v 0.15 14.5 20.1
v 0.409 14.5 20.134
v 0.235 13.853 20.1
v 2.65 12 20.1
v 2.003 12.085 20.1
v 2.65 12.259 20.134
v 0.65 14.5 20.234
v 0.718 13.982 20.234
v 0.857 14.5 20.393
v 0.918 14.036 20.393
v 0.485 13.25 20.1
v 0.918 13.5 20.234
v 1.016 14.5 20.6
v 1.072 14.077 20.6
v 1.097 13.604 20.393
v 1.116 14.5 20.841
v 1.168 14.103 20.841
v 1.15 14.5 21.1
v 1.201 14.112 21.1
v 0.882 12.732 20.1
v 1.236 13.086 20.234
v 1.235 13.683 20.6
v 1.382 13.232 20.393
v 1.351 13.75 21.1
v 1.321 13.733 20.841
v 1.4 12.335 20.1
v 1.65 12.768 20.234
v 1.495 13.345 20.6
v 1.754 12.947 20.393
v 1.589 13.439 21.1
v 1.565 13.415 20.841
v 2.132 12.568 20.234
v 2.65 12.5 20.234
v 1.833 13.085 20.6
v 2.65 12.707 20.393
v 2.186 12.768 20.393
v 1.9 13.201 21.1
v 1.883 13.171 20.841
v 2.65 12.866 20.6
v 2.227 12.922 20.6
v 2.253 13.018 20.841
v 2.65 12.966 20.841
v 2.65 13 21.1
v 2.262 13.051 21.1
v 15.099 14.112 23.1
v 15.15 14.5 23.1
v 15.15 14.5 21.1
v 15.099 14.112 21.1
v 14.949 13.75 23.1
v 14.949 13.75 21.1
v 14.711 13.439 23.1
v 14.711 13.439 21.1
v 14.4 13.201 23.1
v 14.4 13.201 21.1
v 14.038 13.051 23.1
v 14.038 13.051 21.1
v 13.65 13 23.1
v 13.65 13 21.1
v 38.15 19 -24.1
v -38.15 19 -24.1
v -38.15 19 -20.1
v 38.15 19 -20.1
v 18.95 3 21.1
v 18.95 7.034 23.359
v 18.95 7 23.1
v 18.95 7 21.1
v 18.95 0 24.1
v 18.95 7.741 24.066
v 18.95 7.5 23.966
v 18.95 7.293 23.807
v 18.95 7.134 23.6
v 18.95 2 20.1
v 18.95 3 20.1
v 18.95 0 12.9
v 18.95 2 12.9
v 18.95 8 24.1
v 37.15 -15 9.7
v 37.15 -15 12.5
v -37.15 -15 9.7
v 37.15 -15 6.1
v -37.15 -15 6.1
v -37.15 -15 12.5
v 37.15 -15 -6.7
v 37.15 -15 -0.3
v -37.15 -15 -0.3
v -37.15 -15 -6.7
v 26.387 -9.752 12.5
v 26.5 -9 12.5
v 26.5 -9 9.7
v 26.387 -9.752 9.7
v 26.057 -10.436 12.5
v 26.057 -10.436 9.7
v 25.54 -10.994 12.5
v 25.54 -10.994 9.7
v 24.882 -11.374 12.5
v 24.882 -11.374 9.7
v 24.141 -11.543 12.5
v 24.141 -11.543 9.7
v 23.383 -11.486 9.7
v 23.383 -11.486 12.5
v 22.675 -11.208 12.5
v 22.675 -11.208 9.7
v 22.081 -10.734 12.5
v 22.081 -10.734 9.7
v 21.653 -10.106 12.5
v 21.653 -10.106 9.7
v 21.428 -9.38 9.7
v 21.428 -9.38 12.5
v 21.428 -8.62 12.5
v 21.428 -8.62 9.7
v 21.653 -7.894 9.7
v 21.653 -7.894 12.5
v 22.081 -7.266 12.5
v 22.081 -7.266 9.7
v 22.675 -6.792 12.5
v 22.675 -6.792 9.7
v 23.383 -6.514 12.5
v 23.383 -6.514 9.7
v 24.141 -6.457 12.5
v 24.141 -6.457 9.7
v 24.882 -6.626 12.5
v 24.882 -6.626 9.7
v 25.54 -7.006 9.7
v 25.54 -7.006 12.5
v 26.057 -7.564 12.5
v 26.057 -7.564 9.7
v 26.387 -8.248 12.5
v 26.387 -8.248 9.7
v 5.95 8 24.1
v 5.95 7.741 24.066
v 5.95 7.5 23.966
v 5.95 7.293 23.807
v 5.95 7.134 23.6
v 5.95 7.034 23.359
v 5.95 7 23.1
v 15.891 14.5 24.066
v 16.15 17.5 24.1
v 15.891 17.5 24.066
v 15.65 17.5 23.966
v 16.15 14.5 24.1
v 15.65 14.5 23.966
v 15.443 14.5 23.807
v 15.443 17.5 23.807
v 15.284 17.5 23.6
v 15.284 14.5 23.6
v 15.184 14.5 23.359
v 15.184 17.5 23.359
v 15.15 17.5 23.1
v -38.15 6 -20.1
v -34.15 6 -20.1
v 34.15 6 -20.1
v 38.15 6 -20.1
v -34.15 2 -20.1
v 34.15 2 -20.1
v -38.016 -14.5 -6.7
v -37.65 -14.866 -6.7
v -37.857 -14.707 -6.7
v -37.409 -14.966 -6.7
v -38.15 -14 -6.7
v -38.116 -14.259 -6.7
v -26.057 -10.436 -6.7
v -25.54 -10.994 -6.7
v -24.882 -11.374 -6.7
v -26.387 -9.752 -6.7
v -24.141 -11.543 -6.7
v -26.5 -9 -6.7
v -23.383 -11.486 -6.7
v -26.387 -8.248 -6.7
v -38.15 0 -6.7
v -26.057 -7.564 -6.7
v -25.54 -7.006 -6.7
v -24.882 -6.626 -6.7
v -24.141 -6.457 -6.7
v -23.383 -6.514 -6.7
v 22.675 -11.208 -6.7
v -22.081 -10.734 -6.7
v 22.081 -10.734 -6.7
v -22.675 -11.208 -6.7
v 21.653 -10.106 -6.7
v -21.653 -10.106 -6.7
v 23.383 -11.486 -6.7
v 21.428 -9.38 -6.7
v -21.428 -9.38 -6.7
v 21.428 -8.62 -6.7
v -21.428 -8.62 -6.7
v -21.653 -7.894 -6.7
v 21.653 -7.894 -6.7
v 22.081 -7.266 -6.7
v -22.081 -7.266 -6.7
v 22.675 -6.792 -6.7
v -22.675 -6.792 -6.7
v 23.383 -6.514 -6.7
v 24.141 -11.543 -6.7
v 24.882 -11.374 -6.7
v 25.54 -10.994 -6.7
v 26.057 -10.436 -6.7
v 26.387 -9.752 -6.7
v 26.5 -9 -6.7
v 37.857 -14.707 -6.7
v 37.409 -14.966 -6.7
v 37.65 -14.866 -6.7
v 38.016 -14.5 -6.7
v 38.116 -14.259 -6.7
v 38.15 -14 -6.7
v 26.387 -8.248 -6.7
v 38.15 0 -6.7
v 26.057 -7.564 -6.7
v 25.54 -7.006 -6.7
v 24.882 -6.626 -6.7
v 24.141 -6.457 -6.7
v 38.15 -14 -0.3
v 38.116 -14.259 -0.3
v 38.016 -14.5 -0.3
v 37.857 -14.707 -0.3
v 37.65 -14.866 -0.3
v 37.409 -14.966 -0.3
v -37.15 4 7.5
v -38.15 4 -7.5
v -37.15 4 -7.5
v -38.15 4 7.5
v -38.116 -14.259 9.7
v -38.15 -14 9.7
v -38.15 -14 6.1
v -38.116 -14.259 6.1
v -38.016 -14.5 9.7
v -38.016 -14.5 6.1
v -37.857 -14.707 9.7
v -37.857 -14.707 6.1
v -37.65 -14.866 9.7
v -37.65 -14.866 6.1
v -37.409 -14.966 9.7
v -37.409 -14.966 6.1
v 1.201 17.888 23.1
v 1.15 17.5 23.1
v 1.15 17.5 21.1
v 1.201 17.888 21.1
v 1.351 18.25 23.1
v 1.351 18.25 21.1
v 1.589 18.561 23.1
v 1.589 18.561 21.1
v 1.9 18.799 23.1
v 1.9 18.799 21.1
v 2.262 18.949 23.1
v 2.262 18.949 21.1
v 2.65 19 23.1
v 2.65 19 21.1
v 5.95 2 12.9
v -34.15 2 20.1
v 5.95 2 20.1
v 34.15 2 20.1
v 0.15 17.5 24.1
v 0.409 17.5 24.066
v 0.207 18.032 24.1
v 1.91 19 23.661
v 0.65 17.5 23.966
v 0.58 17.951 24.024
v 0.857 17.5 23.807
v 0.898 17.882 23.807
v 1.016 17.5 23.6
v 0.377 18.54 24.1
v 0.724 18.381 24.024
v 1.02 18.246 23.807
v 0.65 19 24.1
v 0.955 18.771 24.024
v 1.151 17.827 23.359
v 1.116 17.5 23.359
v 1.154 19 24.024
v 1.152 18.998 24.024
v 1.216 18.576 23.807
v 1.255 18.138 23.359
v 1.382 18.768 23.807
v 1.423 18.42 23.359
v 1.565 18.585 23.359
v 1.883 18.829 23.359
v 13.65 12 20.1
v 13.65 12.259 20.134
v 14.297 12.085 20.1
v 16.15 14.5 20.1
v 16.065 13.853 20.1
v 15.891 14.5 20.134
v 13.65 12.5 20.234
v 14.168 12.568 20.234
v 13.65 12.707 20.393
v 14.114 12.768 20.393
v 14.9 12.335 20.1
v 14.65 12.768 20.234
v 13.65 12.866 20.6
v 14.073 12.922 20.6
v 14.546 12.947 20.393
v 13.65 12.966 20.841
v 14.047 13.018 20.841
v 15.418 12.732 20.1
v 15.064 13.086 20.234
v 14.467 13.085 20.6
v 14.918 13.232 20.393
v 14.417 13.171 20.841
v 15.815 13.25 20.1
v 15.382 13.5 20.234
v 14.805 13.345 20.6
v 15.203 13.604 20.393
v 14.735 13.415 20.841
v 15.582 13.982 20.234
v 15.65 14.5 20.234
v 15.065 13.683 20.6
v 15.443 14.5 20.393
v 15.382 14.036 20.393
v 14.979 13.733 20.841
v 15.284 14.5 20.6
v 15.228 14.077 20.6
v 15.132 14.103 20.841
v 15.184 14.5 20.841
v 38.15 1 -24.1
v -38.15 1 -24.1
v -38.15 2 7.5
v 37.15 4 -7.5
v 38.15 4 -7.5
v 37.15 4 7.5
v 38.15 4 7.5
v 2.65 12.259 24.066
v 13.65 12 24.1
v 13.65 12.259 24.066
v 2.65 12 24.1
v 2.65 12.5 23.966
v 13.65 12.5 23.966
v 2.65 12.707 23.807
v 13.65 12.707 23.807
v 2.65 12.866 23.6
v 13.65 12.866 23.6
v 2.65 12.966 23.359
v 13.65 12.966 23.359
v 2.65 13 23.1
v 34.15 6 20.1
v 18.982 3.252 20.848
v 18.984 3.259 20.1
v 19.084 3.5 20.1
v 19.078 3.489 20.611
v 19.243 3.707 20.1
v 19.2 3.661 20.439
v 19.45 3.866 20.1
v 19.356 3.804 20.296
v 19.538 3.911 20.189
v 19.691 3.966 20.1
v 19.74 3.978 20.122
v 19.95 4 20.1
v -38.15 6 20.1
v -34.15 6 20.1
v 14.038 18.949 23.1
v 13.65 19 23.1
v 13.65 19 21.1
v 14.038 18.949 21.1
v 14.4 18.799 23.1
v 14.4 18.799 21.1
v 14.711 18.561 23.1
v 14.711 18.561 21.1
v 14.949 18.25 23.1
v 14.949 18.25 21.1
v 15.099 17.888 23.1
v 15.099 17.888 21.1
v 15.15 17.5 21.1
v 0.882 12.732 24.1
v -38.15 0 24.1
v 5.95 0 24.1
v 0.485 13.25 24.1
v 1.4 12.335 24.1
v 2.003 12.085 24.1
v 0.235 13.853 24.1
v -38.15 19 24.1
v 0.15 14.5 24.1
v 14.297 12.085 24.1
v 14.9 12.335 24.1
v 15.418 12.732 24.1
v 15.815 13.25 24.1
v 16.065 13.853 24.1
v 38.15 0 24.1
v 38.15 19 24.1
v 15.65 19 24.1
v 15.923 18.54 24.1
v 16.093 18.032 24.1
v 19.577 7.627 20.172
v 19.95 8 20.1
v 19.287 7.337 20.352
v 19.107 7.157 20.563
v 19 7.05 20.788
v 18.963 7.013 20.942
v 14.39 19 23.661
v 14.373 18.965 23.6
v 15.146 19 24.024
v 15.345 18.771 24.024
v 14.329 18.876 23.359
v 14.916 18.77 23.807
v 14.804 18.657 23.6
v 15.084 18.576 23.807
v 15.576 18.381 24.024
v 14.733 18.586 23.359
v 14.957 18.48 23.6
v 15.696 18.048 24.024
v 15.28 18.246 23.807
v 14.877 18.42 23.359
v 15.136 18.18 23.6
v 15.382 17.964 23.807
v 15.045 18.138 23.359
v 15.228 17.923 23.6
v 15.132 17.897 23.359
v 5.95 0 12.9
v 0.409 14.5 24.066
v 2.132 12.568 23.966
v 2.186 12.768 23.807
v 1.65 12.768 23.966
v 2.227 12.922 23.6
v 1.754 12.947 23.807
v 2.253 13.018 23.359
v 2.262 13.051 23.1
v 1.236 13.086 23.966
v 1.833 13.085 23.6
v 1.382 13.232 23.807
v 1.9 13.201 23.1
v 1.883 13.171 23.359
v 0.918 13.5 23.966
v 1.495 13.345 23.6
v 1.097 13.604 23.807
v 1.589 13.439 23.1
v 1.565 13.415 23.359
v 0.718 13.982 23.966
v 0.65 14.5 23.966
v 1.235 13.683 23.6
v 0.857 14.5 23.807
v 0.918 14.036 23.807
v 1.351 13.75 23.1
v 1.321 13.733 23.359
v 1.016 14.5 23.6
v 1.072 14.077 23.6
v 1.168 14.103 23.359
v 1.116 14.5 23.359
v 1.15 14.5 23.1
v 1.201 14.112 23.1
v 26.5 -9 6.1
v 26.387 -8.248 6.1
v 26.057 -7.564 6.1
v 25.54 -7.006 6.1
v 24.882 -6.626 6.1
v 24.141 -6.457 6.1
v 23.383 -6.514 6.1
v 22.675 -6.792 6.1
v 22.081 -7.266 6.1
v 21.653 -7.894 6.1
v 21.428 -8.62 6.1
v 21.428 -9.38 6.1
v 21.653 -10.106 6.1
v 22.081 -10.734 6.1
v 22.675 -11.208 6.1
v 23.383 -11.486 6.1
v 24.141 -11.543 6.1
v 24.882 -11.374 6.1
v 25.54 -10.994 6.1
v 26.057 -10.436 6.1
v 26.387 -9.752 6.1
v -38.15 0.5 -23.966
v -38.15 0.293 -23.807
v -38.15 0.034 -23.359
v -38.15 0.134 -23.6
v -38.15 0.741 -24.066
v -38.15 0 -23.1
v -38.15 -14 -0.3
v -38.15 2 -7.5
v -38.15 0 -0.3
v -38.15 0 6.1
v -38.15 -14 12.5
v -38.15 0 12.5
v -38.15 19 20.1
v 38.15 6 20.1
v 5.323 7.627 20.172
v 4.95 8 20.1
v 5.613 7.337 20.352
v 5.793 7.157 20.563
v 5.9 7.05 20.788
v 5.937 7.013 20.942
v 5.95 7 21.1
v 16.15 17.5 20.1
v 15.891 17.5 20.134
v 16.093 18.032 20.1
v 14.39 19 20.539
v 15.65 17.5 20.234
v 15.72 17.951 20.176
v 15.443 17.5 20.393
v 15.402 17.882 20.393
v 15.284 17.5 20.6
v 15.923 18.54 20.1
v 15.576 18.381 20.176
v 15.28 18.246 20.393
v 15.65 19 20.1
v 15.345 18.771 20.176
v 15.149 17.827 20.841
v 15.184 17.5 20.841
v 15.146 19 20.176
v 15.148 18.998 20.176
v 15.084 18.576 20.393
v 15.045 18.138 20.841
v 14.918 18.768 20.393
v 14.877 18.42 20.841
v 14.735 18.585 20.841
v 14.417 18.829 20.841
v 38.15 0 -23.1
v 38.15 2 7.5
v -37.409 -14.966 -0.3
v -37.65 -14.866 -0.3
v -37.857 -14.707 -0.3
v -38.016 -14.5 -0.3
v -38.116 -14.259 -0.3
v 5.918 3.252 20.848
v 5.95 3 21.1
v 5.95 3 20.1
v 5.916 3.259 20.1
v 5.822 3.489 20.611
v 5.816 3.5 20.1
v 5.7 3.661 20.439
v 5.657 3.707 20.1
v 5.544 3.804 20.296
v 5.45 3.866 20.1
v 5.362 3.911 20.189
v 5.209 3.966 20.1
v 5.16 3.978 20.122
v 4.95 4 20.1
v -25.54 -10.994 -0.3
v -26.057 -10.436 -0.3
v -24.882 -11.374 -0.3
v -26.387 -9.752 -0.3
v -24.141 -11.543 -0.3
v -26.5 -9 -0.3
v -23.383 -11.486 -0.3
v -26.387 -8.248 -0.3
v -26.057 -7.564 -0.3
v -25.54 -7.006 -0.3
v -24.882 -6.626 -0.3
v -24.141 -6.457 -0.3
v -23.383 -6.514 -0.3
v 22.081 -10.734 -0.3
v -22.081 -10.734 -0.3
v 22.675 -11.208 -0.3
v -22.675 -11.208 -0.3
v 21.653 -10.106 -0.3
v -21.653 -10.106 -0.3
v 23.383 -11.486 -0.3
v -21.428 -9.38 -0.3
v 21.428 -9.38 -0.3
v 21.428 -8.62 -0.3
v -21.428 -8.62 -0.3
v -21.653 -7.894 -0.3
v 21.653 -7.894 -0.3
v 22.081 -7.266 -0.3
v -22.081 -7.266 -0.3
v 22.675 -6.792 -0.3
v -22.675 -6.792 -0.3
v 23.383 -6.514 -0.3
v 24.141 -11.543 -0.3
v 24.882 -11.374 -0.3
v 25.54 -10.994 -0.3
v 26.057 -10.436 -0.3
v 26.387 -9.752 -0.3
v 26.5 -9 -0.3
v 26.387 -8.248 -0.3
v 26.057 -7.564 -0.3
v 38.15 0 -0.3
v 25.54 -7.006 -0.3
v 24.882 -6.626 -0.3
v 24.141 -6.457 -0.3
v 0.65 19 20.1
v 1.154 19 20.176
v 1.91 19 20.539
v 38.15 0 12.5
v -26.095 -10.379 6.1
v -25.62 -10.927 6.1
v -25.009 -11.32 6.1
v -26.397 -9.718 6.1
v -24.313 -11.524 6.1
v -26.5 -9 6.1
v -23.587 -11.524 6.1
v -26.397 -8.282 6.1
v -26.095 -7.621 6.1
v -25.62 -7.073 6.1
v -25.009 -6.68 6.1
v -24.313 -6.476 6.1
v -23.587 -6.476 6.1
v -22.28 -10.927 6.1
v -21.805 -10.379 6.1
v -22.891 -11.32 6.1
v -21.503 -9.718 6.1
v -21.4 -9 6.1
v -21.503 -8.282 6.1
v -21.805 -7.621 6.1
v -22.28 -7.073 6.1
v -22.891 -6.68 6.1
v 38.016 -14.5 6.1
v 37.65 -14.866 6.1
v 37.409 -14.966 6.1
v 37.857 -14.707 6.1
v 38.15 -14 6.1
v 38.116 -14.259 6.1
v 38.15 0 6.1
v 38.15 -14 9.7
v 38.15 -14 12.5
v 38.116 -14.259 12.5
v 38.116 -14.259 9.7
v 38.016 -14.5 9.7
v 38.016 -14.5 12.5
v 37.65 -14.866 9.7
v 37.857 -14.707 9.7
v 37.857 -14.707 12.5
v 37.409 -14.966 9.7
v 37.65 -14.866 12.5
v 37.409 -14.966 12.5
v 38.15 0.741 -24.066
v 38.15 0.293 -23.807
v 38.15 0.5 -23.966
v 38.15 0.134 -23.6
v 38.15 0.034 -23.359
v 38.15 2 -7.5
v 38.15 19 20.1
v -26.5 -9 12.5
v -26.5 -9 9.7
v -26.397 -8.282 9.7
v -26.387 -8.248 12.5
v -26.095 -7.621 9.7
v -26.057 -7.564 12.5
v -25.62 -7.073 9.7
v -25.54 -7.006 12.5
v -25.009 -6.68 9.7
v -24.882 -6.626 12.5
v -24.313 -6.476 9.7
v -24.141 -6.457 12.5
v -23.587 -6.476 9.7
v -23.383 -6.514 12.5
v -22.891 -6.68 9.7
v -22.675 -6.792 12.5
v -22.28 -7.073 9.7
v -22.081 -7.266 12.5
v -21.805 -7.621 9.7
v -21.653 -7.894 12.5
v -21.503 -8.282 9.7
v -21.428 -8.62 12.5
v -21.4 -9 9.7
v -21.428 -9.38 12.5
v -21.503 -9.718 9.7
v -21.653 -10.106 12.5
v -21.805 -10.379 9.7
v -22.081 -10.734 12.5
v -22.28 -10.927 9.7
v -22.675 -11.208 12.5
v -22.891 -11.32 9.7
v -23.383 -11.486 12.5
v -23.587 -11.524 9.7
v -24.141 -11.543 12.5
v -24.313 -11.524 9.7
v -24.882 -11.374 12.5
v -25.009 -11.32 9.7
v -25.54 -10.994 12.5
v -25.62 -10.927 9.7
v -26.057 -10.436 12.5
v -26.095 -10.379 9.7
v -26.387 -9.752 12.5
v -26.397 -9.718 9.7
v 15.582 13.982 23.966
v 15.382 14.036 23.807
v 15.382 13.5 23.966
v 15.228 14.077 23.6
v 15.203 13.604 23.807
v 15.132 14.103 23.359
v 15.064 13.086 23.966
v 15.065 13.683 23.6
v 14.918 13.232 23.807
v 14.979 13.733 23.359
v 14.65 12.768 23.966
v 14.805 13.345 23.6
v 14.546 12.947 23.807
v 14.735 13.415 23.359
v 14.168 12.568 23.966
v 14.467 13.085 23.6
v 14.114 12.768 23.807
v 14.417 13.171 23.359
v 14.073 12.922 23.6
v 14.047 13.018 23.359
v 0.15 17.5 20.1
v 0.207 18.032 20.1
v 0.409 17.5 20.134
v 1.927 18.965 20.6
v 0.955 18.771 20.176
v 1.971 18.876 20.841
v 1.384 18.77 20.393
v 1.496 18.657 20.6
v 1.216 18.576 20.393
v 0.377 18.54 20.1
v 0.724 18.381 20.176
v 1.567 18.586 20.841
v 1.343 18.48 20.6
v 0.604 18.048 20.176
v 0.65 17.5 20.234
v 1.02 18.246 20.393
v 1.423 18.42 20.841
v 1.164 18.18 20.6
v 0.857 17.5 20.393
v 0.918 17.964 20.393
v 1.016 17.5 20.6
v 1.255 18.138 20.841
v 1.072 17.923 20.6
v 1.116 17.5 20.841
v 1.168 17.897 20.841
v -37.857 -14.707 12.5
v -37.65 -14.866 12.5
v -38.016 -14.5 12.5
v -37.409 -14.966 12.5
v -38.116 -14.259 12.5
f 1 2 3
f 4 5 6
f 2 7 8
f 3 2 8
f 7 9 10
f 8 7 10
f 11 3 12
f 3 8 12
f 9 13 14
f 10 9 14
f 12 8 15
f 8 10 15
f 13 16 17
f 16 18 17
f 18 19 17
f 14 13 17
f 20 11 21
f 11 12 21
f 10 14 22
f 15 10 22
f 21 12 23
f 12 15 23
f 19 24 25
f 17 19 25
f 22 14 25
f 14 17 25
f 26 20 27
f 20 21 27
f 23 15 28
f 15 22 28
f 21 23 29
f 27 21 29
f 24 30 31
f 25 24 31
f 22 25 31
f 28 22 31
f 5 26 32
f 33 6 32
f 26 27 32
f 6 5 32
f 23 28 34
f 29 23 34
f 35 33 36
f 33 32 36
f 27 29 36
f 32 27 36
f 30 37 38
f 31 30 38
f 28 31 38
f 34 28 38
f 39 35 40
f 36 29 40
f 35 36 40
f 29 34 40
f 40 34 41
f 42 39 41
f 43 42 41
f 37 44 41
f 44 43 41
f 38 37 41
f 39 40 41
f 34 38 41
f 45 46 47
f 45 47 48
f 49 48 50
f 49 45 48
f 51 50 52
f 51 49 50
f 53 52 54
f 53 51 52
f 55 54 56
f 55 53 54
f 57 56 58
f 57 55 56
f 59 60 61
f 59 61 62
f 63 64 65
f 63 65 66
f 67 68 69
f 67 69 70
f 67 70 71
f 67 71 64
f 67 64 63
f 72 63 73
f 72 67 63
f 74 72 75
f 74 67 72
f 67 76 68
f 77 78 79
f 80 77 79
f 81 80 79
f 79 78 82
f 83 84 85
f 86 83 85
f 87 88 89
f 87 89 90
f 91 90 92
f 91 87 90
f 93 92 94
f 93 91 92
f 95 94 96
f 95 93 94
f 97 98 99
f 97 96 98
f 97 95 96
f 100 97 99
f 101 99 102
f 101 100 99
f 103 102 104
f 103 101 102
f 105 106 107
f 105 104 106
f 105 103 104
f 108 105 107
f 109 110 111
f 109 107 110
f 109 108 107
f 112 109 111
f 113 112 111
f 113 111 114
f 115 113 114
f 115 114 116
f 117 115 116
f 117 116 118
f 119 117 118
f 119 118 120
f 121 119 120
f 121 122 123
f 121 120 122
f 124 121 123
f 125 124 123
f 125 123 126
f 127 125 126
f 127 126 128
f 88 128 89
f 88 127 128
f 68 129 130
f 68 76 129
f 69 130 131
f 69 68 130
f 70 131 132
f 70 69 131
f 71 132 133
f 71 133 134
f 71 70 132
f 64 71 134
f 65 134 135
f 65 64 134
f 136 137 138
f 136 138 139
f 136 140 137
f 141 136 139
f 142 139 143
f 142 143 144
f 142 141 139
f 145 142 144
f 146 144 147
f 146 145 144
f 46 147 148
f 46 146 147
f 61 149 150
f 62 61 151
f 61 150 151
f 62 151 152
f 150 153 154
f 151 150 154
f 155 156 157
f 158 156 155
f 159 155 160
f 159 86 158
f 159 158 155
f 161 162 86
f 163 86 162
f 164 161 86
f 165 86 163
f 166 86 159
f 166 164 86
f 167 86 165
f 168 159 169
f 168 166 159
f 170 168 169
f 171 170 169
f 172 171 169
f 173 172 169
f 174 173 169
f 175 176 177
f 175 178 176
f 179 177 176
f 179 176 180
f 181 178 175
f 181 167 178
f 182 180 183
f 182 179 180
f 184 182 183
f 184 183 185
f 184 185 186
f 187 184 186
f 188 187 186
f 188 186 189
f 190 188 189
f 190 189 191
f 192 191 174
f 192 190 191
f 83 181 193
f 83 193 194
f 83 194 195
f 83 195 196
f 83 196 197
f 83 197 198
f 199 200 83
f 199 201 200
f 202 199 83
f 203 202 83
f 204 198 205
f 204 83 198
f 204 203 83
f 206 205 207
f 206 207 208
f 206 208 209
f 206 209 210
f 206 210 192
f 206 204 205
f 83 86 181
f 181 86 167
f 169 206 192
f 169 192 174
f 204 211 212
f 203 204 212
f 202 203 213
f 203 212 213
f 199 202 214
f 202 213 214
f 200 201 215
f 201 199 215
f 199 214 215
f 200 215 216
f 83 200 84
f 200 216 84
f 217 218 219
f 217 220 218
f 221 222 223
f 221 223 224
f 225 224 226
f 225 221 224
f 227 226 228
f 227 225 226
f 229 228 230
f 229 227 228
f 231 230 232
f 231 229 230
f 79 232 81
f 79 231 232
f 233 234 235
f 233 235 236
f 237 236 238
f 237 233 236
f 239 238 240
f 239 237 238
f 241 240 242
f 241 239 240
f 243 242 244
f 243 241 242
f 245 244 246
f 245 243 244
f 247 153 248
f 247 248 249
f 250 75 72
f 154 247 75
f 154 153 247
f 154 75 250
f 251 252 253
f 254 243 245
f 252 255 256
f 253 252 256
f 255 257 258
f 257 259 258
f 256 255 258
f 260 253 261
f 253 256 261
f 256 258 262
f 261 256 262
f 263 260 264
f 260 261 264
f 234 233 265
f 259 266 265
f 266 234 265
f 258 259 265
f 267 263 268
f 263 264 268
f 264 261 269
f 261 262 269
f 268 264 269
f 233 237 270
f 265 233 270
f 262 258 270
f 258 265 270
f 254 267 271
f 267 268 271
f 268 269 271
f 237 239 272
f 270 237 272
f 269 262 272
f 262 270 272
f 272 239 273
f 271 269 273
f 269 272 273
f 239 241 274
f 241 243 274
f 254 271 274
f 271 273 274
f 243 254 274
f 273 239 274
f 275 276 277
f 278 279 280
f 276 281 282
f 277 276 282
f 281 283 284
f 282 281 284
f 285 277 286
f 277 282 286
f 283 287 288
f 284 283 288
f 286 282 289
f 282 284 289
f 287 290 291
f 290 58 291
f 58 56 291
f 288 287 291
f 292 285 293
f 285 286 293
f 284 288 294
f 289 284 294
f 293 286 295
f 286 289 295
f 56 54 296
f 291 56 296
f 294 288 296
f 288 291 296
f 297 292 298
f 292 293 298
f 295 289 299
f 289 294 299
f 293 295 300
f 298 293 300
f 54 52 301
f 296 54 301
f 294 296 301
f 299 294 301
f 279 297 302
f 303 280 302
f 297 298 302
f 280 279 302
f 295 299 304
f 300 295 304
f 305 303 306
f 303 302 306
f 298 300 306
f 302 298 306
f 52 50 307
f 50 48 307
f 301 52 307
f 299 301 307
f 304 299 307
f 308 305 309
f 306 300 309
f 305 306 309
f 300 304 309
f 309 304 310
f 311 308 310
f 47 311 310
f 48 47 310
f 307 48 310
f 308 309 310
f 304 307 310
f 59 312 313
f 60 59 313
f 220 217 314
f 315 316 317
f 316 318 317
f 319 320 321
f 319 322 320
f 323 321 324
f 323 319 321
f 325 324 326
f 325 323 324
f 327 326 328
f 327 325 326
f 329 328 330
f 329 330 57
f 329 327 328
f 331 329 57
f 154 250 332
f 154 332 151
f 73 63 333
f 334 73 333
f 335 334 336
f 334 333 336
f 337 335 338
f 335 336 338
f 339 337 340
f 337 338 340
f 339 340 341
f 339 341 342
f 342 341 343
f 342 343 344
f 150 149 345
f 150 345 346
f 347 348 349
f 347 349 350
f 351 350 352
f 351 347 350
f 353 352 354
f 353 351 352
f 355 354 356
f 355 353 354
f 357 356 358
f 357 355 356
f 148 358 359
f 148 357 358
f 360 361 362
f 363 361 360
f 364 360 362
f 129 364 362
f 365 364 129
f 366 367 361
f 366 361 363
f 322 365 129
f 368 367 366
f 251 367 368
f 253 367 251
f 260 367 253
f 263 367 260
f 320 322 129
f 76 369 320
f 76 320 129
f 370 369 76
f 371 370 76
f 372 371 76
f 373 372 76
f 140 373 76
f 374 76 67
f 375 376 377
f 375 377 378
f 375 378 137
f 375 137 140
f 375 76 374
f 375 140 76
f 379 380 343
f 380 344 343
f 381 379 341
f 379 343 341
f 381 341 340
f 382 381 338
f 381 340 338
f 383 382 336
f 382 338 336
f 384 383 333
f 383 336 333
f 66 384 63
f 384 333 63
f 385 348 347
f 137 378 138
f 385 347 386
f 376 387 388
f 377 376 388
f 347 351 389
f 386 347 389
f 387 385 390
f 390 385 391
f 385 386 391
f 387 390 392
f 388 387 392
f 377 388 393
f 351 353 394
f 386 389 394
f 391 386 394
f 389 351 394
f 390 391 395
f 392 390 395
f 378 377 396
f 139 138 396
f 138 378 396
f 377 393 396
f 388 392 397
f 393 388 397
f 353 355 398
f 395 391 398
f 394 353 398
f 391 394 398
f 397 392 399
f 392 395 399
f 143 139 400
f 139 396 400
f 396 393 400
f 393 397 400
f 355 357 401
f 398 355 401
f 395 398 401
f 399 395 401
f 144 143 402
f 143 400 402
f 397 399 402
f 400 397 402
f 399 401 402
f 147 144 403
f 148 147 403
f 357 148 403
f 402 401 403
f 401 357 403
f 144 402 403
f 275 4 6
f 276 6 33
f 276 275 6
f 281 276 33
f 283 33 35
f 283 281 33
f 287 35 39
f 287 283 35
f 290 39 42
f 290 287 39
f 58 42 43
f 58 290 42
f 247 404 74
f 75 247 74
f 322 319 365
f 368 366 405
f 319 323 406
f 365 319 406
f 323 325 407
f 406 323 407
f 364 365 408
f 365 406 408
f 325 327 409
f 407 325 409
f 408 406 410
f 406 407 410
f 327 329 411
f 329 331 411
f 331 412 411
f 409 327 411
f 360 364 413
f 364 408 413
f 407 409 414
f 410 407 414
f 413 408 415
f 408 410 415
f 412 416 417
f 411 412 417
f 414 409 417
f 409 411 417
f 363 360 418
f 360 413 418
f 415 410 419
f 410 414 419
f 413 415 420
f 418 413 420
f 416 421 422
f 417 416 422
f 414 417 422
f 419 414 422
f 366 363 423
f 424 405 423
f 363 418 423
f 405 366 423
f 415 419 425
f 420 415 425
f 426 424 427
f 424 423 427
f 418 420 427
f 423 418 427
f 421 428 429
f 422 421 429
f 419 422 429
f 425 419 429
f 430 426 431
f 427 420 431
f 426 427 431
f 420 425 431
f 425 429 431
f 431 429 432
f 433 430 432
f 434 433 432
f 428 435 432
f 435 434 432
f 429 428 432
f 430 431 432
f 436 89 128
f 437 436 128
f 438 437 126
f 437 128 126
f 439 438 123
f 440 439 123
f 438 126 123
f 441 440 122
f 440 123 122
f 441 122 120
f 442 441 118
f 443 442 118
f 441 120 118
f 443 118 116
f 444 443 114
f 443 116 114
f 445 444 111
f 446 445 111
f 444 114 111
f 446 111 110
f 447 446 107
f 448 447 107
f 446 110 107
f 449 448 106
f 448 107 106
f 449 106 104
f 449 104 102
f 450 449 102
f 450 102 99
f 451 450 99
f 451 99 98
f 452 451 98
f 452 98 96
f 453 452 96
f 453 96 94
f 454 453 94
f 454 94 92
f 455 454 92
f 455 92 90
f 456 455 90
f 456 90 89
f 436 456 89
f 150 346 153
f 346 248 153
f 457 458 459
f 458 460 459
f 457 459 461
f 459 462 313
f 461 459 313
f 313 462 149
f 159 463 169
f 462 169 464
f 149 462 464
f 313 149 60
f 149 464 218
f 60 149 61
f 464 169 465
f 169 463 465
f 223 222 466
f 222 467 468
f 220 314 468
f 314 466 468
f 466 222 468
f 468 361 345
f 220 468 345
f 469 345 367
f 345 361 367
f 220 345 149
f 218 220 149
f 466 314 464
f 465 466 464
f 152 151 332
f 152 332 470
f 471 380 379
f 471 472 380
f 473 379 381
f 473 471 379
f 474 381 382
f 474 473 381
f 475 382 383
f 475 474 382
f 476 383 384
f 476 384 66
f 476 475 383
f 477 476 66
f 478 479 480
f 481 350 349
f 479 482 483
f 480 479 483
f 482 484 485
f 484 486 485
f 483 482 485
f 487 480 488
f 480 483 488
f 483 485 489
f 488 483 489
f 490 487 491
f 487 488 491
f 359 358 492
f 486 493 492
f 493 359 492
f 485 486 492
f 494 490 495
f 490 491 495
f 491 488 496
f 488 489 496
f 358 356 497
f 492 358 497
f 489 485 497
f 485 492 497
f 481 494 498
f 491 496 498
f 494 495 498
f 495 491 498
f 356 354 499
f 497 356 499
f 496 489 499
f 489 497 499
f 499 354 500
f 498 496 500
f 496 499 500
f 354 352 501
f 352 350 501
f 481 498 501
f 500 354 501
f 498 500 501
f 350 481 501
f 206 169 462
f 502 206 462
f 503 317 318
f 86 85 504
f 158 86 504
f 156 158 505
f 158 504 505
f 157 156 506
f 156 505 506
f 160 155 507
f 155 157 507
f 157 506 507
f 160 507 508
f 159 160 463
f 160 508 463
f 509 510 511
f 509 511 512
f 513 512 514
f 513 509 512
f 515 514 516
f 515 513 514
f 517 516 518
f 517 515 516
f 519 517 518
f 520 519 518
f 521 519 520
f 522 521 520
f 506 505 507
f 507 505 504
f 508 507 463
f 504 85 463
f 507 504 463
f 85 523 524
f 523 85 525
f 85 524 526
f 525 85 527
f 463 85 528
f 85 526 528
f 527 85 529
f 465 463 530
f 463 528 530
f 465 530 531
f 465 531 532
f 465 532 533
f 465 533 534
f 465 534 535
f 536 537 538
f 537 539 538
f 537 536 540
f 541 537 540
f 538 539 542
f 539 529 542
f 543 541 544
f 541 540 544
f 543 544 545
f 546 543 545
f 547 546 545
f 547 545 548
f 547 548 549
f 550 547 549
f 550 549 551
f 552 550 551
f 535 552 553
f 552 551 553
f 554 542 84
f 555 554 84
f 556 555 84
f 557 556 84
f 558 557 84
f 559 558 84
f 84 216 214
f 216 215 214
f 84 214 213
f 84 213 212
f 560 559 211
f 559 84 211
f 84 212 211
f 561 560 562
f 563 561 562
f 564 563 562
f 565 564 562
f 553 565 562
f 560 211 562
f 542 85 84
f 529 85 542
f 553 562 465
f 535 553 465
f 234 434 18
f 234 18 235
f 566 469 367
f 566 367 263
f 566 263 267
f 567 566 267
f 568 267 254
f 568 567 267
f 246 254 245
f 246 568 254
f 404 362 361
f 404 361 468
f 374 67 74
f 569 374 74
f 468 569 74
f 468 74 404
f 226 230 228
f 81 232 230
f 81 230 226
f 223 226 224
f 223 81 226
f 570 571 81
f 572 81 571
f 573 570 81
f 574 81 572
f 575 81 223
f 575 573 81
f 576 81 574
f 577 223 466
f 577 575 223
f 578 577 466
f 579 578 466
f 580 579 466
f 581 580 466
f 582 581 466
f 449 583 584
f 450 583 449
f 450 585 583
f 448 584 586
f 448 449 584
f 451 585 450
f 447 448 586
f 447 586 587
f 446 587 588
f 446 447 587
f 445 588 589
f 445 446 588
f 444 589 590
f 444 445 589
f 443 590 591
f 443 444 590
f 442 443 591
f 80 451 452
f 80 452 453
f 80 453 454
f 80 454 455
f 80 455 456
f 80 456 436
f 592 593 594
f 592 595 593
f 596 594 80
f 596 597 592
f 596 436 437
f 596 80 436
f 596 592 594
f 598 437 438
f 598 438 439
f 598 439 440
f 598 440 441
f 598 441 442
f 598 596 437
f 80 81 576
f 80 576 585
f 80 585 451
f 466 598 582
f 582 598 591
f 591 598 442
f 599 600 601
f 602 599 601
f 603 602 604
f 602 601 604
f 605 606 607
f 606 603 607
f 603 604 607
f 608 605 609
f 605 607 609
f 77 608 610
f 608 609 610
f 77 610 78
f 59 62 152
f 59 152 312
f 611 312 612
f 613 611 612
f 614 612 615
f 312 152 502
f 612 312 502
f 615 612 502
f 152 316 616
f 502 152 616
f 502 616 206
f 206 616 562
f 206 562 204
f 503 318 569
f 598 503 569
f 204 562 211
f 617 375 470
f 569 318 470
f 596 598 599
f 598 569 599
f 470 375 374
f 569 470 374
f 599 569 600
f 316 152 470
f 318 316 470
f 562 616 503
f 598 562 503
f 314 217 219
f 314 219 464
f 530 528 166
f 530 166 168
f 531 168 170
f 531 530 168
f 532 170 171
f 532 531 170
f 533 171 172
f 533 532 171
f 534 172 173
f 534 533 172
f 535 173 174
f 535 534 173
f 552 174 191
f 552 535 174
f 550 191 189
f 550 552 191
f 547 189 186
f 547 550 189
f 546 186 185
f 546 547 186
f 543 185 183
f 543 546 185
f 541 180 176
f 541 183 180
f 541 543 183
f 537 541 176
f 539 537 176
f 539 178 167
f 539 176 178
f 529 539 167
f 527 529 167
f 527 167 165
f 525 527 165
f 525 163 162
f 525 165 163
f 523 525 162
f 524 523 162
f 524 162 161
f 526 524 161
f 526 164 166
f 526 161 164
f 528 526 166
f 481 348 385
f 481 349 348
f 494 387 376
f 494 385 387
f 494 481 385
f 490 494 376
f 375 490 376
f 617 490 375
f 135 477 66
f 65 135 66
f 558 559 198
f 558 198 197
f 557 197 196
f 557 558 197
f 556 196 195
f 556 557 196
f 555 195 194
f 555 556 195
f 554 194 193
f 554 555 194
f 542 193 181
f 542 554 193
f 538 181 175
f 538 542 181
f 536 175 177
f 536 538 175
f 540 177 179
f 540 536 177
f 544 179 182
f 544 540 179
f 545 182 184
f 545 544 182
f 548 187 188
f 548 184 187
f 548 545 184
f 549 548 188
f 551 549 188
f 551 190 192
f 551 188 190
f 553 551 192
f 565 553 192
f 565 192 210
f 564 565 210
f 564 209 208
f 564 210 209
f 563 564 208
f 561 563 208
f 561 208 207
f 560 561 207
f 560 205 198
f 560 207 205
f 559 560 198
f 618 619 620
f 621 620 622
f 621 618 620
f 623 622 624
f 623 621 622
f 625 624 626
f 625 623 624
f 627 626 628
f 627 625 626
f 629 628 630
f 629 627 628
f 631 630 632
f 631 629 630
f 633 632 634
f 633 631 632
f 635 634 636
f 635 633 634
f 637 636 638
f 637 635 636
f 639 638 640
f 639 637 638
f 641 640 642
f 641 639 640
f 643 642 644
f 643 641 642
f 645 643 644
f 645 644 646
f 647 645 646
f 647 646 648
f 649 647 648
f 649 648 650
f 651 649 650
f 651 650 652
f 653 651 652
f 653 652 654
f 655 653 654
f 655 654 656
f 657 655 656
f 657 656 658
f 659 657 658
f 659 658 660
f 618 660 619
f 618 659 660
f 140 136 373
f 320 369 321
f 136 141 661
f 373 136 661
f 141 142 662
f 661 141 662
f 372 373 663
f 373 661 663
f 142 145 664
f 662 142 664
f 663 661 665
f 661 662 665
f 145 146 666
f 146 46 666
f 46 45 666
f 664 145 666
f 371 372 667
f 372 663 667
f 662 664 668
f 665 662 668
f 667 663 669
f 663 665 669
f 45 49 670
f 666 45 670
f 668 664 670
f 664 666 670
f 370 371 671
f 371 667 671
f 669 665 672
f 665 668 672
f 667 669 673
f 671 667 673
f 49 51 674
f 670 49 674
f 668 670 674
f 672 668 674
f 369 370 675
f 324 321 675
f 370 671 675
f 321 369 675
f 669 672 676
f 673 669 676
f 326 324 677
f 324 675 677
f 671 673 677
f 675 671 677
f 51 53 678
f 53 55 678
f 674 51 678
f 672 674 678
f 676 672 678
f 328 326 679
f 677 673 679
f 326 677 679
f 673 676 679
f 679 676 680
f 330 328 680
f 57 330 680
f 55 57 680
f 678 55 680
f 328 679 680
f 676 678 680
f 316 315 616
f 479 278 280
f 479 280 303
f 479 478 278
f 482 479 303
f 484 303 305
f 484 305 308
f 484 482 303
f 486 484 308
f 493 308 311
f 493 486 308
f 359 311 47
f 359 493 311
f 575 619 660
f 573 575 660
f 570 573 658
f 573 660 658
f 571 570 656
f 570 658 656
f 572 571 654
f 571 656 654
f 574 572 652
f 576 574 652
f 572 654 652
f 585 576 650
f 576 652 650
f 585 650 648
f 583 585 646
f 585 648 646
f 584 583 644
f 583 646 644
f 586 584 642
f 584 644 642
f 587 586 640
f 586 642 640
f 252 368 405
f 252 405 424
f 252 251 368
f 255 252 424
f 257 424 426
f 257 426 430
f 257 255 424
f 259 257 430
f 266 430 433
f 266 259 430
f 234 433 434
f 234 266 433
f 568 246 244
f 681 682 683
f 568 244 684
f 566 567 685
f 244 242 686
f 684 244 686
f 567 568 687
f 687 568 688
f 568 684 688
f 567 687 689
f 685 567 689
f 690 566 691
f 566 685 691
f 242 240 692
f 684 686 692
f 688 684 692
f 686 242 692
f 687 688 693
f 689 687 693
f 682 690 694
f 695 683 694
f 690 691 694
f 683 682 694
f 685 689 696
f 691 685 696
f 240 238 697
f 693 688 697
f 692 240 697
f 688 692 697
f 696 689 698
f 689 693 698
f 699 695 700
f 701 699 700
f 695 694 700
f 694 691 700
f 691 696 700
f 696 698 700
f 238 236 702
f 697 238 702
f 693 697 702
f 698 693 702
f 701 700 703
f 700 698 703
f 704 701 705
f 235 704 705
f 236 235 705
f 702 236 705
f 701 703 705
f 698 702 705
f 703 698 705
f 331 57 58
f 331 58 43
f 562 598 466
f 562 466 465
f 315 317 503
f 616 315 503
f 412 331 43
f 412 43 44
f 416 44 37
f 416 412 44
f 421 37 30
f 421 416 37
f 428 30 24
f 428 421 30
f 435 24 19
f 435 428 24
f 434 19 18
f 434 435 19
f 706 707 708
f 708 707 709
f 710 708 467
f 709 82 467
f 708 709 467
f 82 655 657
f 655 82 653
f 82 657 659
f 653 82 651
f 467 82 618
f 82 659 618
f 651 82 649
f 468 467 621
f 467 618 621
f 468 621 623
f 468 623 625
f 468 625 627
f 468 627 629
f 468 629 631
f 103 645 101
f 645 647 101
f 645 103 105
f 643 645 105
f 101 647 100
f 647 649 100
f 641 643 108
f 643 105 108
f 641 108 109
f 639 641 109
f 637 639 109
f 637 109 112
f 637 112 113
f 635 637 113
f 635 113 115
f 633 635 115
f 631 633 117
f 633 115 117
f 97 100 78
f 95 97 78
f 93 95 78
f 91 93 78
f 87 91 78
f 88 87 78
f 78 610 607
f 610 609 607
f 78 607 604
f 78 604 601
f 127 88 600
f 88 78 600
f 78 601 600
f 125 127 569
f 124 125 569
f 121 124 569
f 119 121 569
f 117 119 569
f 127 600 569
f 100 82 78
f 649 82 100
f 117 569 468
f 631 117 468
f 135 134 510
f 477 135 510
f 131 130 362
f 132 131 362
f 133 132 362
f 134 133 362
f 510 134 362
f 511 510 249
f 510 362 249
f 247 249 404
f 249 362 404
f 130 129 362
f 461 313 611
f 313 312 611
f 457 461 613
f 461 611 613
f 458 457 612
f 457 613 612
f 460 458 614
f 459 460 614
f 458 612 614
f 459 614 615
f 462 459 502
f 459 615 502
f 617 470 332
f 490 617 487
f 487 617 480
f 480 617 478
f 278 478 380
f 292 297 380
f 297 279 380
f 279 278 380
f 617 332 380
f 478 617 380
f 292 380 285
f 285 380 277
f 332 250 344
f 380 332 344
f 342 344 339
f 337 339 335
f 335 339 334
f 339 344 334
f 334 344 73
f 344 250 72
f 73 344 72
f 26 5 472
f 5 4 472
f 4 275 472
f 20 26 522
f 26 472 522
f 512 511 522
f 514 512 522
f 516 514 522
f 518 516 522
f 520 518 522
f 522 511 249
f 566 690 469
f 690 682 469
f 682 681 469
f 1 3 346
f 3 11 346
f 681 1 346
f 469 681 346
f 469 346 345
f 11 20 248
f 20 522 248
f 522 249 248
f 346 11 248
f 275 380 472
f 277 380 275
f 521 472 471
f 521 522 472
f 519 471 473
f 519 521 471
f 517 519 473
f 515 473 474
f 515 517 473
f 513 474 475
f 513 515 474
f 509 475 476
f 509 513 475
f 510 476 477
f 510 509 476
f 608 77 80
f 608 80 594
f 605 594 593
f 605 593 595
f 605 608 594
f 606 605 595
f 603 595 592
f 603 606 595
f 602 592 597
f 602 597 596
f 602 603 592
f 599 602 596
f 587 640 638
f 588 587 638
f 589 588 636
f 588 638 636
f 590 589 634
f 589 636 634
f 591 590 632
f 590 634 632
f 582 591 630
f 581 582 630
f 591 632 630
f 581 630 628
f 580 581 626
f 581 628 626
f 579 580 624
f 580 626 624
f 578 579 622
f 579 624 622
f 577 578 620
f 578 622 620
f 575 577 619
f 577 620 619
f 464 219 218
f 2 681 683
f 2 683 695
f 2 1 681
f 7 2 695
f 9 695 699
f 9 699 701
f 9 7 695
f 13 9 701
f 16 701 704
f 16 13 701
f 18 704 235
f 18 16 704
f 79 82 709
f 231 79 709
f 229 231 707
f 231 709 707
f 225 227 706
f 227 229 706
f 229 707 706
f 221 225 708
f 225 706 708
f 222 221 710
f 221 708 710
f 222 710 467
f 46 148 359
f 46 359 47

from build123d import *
from build123d.topology import SkipClean

# Parameters (mm, degrees)
SKETCH2_W               = 76.3
SKETCH2_H               = 48.2
BOSS_EXTRUDE1_DEPTH     = 4
BOSS_EXTRUDE2_DEPTH     = 15
SKETCH10_W              = 4
SKETCH10_H              = 40.2
BOSS_EXTRUDE5_DEPTH     = 2
CUT_EXTRUDE1_DEPTH      = 3
CUT_EXTRUDE1_DEPTH_BACK = 4
SKETCH5_W               = 13
SKETCH5_H               = 11.2
CUT_EXTRUDE2_REACH      = 66.34
CUT_EXTRUDE3_DEPTH      = 7.5
FILLET3_R               = 1
SKETCH17_W              = 76.3
SKETCH17_H              = 8
SKETCH17_H_2            = 6
BOSS_EXTRUDE6_DEPTH     = 15
SKETCH20_R              = 2.55
CUT_EXTRUDE5_DEPTH      = 65.340209
FILLET4_R               = 1
FILLET5_R               = 1
SKETCH21_W              = 68.3
SKETCH21_H              = 40.2
CUT_EXTRUDE6_DEPTH      = 2
SKETCH29_R              = 2.55
BOSS_EXTRUDE9_DEPTH     = 40.2
SKETCH30_W              = 17.4
SKETCH30_H              = 15
SKETCH30_W_2            = 11.6
SKETCH30_W_3            = 6.4
CUT_EXTRUDE12_DEPTH     = 83.240501


with BuildPart() as part:
    # Sketch2 → Boss-Extrude1 (new body)
    with BuildSketch(Plane(origin=(0, 0, 0), x_dir=(1, 0, 0), z_dir=(0, 1, 0))):
        Rectangle(SKETCH2_W, SKETCH2_H)
    extrude(amount=BOSS_EXTRUDE1_DEPTH)

    # Sketch3 → Boss-Extrude2 (add)
    with BuildSketch(Plane(origin=(0, 4, 0), x_dir=(1, 0, 0), z_dir=(0, 1, 0))):
        Polygon((38.15, 24.1), (-38.15, 24.1), (-38.15, 20.1), (-34.15, 20.1), (34.15, 20.1), (38.15, 20.1), align=None)
        Polygon((-38.15, -24.1), (38.15, -24.1), (38.15, -20.1), (34.15, -20.1), (-34.15, -20.1), (-38.15, -20.1), align=None)
    extrude(amount=BOSS_EXTRUDE2_DEPTH)

    # Sketch10 → Boss-Extrude5 (add)
    with BuildSketch(Plane(origin=(0, 4, 0), x_dir=(1, 0, 0), z_dir=(0, 1, 0))):
        with Locations((-36.15, 0)):
            Rectangle(SKETCH10_W, SKETCH10_H)
        with Locations((36.15, 0)):
            Rectangle(SKETCH10_W, SKETCH10_H)
    extrude(amount=BOSS_EXTRUDE5_DEPTH)

    # Sketch5 → Cut-Extrude1 (cut, two sides: drawn at the far end of the back side and taken through both)
    with BuildSketch(Plane(origin=(0, 4, 0), x_dir=(1, 0, 0), z_dir=(0, 1, 0)).offset(-CUT_EXTRUDE1_DEPTH_BACK)):
        with Locations((12.45, -18.5)):
            Rectangle(SKETCH5_W, SKETCH5_H)
    extrude(amount=CUT_EXTRUDE1_DEPTH + CUT_EXTRUDE1_DEPTH_BACK, mode=Mode.SUBTRACT)

    # Sketch8 → Cut-Extrude2 (cut, up to next)
    with BuildSketch(Plane.XY.offset(24.1), mode=Mode.PRIVATE) as cut_extrude2_sk1:
        with BuildLine():
            Line((2.65, 19), (13.65, 19))
            ThreePointArc((13.65, 19), (14.71066, 18.56066), (15.15, 17.5))
            Line((15.15, 17.5), (15.15, 14.5))
            ThreePointArc((15.15, 14.5), (14.71066, 13.43934), (13.65, 13))
            Line((13.65, 13), (2.65, 13))
            ThreePointArc((2.65, 13), (1.58934, 13.43934), (1.15, 14.5))
            Line((1.15, 14.5), (1.15, 17.5))
            ThreePointArc((1.15, 17.5), (1.58934, 18.56066), (2.65, 19))
        make_face()
    cut_extrude2_tool1 = extrude(cut_extrude2_sk1.sketch, amount=-CUT_EXTRUDE2_REACH, mode=Mode.PRIVATE) & part.part
    add(cut_extrude2_tool1.solids().sort_by_distance((8.15, 16, 24.1))[0], mode=Mode.SUBTRACT)

    # Sketch13 → Cut-Extrude3 (cut, symmetric)
    with BuildSketch(Plane.XY):
        Polygon((38.15, 4), (37.15, 4), (38.15, 2), align=None)
    cut_extrude3 = extrude(amount=CUT_EXTRUDE3_DEPTH, both=True, mode=Mode.SUBTRACT)

    # Mirror2: Cut-Extrude3 across plane
    add(cut_extrude3.mirror(Plane(origin=(0, 0, 0), x_dir=(0, 0, 1), z_dir=(1, 0, 0))), mode=Mode.SUBTRACT)

    # Fillet3
    fillet3_edges = [part.edges().sort_by_distance(p)[0] for p in [
        (0, 0, -24.1),
    ]]
    fillet(fillet3_edges, radius=FILLET3_R)

    # Sketch17 → Boss-Extrude6 (add)
    with BuildSketch(Plane.XZ):
        with Locations((0, 20.1)):
            Rectangle(SKETCH17_W, SKETCH17_H)
        with Locations((0, 6.7)):
            Rectangle(SKETCH17_W, SKETCH17_H_2)
    extrude(amount=BOSS_EXTRUDE6_DEPTH)

    # Sketch20 → Cut-Extrude5 (cut, through all)
    with BuildSketch(Plane.XY.offset(24.1)):
        with Locations((23.95, -9)):
            Circle(SKETCH20_R)
        with Locations((-23.95, -9)):
            Circle(SKETCH20_R)
    extrude(amount=-CUT_EXTRUDE5_DEPTH, mode=Mode.SUBTRACT)

    # Fillet4
    fillet4_edges = [part.edges().sort_by_distance(p)[0] for p in [
        (-38.15, -15, 20.1),
        (38.15, -15, 20.1),
        (-38.15, -15, 6.7),
        (38.15, -15, 6.7),
    ]]
    fillet(fillet4_edges, radius=FILLET4_R)

    # Fillet5
    fillet5_edges = [part.edges().sort_by_distance(p)[0] for p in [
        (1.58934, 18.56066, 24.1),
        (1.15, 16, 24.1),
        (1.58934, 13.43934, 24.1),
        (8.15, 13, 24.1),
        (14.71066, 13.43934, 24.1),
        (15.15, 16, 24.1),
        (14.71066, 18.56066, 24.1),
        (1.15, 16, 20.1),
        (1.58934, 18.56066, 20.1),
        (14.71066, 18.56066, 20.1),
        (15.15, 16, 20.1),
        (14.71066, 13.43934, 20.1),
        (8.15, 13, 20.1),
        (1.58934, 13.43934, 20.1),
        (12.45, 7, 24.1),
        (5.95, 5.5, 20.1),
        (18.95, 5.5, 20.1),
        (5.95, 4, 16.5),
        (18.95, 4, 16.5),
        (12.45, 4, 12.9),
        (12.45, 7, 20.1),
    ]]
    fillet(fillet5_edges, radius=FILLET5_R)

    # Sketch21 → Cut-Extrude6 (cut)
    with BuildSketch(Plane(origin=(0, 4, 0), x_dir=(1, 0, 0), z_dir=(0, 1, 0))):
        Rectangle(SKETCH21_W, SKETCH21_H)
    extrude(amount=-CUT_EXTRUDE6_DEPTH, mode=Mode.SUBTRACT)

    # Sketch29 → Boss-Extrude9 (add, through all)
    with SkipClean():  # the faces are left unmerged after this step: merging them gives an invalid solid
        with BuildSketch(Plane(origin=(0, 0, 16.1), x_dir=(-1, 0, 0), z_dir=(0, 0, -1))):
            with BuildLine():
                Line((-37.15, -15), (37.15, -15))
                ThreePointArc((37.15, -15), (37.857107, -14.707107), (38.15, -14))
                Line((38.15, -14), (38.15, 0))
                Line((38.15, 0), (-5.95, 0))
                Line((-5.95, 0), (-18.95, 0))
                Line((-18.95, 0), (-38.15, 0))
                Line((-38.15, 0), (-38.15, -14))
                ThreePointArc((-38.15, -14), (-37.857107, -14.707107), (-37.15, -15))
            make_face()
            with Locations(Location((-23.95, -9, 0), (0, 0, 180))):
                Circle(SKETCH29_R, mode=Mode.SUBTRACT)
            with Locations((23.95, -9)):
                Circle(SKETCH29_R, mode=Mode.SUBTRACT)
        extrude(amount=BOSS_EXTRUDE9_DEPTH)

    # Sketch30 → Cut-Extrude12 (cut, through all)
    with BuildSketch(Plane(origin=(38.15, 0, 0), x_dir=(0, 0, -1), z_dir=(1, 0, 0))):
        with Locations((15.4, -7.5)):
            Rectangle(SKETCH30_W, SKETCH30_H)
        with Locations((-18.3, -7.5)):
            Rectangle(SKETCH30_W_2, SKETCH30_H)
        with Locations((-2.9, -7.5)):
            Rectangle(SKETCH30_W_3, SKETCH30_H)
    extrude(amount=-CUT_EXTRUDE12_DEPTH, mode=Mode.SUBTRACT)


solid = part.part
